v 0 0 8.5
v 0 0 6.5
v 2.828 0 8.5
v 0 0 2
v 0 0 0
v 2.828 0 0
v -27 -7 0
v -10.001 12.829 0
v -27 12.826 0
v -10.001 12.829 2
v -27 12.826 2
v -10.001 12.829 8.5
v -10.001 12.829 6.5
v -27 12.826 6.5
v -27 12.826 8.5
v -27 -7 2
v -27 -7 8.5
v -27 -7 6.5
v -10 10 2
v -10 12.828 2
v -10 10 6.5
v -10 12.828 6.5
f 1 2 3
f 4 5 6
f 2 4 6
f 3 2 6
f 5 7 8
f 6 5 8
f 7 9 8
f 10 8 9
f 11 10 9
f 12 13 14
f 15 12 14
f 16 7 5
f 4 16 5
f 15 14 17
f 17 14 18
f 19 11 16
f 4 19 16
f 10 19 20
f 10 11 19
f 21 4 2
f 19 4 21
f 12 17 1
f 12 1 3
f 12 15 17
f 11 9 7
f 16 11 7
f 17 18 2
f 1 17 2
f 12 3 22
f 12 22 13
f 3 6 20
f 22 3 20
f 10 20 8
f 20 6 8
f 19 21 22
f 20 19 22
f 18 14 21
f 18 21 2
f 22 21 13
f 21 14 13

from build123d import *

# Parameters (mm, degrees)
F1_DEPTH = 8.5
F3_START = 2
F2_W     = 17
F2_H     = 3.2842862599
F3_DEPTH = 4.5


with BuildPart() as f1:
    # F0 (on Top) → F1 (new body)
    with BuildSketch(Plane.XY):
        Polygon((-27, 0), (0, 0), (-10, 10), (-27, 10), align=None)
        Polygon((-27, -7), (0, 0), (-27, 0), align=None)
        Polygon((-10, 10), (0, 0), (2.8284271247, 0), (-10.0005280692, 12.828955194), align=None)
        Polygon((-27, 10), (-10, 10), (-10.0005280692, 12.828955194), (-27, 12.8257819737), align=None)
    extrude(amount=F1_DEPTH)

    # F2 (on Top) → F3 (cut)
    with BuildSketch(Plane.XY.offset(F3_START)):
        Polygon((-27, -7), (0, 0), (-27, 0), align=None)
        Polygon((-27, 0), (0, 0), (-10, 10), (-27, 10), align=None)
        with Locations((-18.5, 11.6421431299)):
            Rectangle(F2_W, F2_H)
    extrude(amount=F3_DEPTH, mode=Mode.SUBTRACT)


solid = f1.part
